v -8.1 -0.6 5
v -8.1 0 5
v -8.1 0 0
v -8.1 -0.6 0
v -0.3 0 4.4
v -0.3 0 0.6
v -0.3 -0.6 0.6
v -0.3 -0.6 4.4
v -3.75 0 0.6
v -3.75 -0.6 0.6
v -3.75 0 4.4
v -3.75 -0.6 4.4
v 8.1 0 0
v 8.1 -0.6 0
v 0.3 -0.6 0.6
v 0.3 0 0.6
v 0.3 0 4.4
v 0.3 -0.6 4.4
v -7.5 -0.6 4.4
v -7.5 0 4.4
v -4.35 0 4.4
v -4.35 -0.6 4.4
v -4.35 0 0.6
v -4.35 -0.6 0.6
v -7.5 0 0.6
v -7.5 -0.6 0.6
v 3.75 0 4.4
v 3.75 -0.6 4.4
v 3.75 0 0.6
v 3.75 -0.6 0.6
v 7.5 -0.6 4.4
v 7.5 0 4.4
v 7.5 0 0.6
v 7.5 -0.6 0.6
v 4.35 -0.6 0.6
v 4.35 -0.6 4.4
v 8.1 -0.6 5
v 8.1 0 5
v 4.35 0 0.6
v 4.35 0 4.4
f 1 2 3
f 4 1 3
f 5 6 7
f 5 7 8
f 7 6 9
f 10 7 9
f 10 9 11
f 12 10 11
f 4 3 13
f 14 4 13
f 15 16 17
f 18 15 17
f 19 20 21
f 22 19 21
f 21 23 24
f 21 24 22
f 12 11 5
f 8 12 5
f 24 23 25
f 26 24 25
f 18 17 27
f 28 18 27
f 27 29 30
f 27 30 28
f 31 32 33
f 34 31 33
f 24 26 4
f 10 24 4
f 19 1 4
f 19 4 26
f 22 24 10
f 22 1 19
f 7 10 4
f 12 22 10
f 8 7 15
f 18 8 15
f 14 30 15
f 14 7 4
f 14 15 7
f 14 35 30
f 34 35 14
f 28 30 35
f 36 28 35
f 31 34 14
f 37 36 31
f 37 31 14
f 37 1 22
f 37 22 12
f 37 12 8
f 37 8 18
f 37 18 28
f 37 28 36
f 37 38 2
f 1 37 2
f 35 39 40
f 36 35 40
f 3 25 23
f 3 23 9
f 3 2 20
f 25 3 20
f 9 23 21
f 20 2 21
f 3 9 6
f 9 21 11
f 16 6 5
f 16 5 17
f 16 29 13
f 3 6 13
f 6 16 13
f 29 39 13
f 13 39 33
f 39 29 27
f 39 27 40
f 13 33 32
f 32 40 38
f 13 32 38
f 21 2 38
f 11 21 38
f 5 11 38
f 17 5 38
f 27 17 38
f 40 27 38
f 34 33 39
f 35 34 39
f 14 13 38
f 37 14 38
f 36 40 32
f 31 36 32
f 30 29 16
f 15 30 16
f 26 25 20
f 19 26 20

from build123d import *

# Parameters (mm, degrees)
F0_W     = 0.3
F0_H     = 3.8
F0_W_2   = 0.6
F0_H_2   = 0.6
F1_DEPTH = 0.6


with BuildPart() as f1:
    # F0 (on Front) → F1 (new body)
    with BuildSketch(Plane.XZ):
        with Locations((-0.15, 2.5)):
            Rectangle(F0_W, F0_H)
        with Locations((-7.8, 0.3)):
            Rectangle(F0_W_2, F0_H_2)
        with Locations((-7.8, 2.5)):
            Rectangle(F0_W_2, F0_H)
        Polygon((0, 5), (0, 4.4), (0.3, 4.4), (3.75, 4.4), (4.35, 4.4), (7.5, 4.4), (7.5, 5), align=None)
        Polygon((-0.3, 4.4), (0, 4.4), (0, 5), (-7.5, 5), (-7.5, 4.4), (-4.35, 4.4), (-3.75, 4.4), align=None)
        with Locations((0.15, 2.5)):
            Rectangle(F0_W, F0_H)
        with Locations((4.05, 2.5)):
            Rectangle(F0_W_2, F0_H)
        with Locations((7.8, 2.5)):
            Rectangle(F0_W_2, F0_H)
        with Locations((-7.8, 4.7)):
            Rectangle(F0_W_2, F0_H_2)
        Polygon((-7.5, 0), (0, 0), (0, 0.6), (-0.3, 0.6), (-3.75, 0.6), (-4.35, 0.6), (-7.5, 0.6), align=None)
        with Locations((7.8, 0.3)):
            Rectangle(F0_W_2, F0_H_2)
        with Locations((-4.05, 2.5)):
            Rectangle(F0_W_2, F0_H)
        Polygon((0, 0.6), (0, 0), (7.5, 0), (7.5, 0.6), (4.35, 0.6), (3.75, 0.6), (0.3, 0.6), align=None)
        with Locations((7.8, 4.7)):
            Rectangle(F0_W_2, F0_H_2)
    extrude(amount=F1_DEPTH)


solid = f1.part
